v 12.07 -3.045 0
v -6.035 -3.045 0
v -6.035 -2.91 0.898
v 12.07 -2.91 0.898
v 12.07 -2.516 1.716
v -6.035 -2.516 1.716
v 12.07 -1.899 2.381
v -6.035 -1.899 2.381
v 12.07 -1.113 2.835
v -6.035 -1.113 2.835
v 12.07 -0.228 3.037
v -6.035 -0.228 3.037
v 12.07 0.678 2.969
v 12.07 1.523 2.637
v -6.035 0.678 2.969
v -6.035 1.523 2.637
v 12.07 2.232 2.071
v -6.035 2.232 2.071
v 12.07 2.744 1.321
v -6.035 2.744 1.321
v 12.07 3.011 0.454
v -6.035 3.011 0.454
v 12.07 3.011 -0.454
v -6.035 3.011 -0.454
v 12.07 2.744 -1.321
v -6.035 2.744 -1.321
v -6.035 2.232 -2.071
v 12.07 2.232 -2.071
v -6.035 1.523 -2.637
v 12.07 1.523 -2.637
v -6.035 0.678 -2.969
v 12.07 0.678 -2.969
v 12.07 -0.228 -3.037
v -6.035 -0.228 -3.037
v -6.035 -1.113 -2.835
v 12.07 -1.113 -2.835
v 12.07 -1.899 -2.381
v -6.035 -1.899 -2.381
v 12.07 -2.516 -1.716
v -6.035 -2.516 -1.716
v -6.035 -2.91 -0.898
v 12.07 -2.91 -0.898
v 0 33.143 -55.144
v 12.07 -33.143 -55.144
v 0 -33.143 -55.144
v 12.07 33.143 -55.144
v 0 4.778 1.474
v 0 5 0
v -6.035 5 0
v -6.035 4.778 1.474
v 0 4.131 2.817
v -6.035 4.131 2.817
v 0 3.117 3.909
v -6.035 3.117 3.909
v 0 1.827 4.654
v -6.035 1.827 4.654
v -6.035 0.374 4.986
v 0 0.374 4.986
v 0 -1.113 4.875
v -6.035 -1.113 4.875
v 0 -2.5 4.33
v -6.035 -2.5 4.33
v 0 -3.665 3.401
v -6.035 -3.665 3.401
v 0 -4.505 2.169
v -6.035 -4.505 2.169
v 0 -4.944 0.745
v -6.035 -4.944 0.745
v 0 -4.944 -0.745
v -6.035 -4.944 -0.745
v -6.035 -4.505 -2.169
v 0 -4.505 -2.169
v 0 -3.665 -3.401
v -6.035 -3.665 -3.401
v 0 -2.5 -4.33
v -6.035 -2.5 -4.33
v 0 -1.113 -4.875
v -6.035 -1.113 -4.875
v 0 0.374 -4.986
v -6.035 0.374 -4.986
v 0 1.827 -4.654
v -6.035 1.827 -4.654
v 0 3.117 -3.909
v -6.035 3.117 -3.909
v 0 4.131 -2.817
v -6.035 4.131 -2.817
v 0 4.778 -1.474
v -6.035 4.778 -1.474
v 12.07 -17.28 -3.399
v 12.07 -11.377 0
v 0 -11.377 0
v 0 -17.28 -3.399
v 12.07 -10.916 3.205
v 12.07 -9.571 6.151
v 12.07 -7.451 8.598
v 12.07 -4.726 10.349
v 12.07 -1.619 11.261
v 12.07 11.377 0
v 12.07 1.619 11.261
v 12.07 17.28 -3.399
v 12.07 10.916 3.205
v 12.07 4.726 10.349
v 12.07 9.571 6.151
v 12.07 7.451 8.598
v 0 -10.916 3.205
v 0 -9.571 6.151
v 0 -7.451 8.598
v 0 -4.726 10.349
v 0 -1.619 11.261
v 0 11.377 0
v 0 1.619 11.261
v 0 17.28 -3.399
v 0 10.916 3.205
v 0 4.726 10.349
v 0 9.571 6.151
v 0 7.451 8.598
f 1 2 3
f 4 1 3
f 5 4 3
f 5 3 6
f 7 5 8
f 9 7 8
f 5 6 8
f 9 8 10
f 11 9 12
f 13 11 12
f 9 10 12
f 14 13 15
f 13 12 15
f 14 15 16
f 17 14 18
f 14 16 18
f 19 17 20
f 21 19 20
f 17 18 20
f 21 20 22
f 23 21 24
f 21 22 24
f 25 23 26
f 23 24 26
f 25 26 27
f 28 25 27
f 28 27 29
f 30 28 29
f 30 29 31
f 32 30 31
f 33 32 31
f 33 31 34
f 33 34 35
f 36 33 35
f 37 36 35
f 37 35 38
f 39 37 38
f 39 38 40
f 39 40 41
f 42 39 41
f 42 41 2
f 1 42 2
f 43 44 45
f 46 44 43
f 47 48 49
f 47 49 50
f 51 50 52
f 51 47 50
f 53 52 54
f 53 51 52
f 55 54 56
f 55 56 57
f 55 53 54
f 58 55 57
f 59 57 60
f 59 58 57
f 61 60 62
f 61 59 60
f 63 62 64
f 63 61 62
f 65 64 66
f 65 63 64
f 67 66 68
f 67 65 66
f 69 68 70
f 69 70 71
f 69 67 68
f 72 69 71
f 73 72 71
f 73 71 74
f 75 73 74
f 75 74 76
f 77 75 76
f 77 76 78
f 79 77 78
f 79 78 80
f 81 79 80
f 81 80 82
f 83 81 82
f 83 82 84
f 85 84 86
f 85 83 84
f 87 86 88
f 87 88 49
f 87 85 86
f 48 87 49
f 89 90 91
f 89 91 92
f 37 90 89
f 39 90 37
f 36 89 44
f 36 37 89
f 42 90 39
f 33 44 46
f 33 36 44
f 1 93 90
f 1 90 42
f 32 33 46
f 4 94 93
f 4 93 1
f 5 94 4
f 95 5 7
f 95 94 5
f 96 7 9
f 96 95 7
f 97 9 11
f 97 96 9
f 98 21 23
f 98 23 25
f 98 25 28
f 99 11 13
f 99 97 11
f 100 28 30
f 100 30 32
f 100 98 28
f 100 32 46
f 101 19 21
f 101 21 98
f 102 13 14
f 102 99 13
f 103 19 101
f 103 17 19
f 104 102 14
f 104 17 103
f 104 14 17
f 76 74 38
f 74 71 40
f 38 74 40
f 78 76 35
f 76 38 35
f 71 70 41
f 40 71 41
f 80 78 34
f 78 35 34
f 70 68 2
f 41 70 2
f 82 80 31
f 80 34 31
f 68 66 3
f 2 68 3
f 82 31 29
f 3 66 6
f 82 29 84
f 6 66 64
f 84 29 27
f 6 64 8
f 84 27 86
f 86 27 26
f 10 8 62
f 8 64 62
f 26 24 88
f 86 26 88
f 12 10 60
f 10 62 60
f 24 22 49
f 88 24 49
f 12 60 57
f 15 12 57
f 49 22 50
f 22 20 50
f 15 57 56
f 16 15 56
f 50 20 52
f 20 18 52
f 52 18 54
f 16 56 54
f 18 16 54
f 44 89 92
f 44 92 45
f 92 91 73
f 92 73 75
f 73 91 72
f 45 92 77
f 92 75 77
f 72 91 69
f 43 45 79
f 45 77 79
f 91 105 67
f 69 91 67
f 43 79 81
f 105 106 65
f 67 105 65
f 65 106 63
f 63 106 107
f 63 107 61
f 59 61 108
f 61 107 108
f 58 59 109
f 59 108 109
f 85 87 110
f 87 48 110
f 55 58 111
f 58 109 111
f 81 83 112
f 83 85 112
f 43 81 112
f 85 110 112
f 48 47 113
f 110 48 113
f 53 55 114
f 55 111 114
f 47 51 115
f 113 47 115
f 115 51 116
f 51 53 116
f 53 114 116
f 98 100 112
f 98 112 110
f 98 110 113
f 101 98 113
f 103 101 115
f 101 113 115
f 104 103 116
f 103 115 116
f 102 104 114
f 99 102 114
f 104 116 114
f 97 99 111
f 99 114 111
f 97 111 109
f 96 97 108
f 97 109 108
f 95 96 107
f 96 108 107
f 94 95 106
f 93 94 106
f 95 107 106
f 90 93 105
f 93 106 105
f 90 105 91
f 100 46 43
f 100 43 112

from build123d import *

# Parameters (mm, degrees)
F0_R     = 5
F1_DEPTH = 6.035
F2_R     = 11.377245
F3_DEPTH = 12.07
F5_DEPTH = 12.07
F6_R     = 3.045388
F7_DEPTH = 25


with BuildPart() as f1:
    # F0 (on Right) → F1 (new body)
    with BuildSketch(Plane.YZ):
        Circle(F0_R)
    extrude(amount=-F1_DEPTH)

    # F2 (on face) → F3 (join)
    with BuildSketch(Plane.YZ):
        Circle(F2_R)
    extrude(amount=F3_DEPTH)

    # F4 (on face) → F5 (join)
    with BuildSketch(Plane.YZ.offset(12.07)):
        with BuildLine():
            ThreePointArc((11.377245, 0), (0, -11.377245), (-11.377245, 0))
            Line((-11.377245, 0), (-17.279675, -3.399281))
            Line((-17.279675, -3.399281), (-33.142988, -55.143889))
            Line((-33.142988, -55.143889), (0, -55.143889))
            Line((0, -55.143889), (33.142988, -55.143889))
            Line((33.142988, -55.143889), (17.279675, -3.399281))
            Line((17.279675, -3.399281), (11.377245, 0))
        make_face()
    extrude(amount=-F5_DEPTH)

    # F6 (on face) → F7 (cut)
    with BuildSketch(Plane(origin=(-6.035, 0, 0), x_dir=(0, -1, 0), z_dir=(-1, 0, 0))):
        Circle(F6_R)
    extrude(amount=-F7_DEPTH, mode=Mode.SUBTRACT)


solid = f1.part
